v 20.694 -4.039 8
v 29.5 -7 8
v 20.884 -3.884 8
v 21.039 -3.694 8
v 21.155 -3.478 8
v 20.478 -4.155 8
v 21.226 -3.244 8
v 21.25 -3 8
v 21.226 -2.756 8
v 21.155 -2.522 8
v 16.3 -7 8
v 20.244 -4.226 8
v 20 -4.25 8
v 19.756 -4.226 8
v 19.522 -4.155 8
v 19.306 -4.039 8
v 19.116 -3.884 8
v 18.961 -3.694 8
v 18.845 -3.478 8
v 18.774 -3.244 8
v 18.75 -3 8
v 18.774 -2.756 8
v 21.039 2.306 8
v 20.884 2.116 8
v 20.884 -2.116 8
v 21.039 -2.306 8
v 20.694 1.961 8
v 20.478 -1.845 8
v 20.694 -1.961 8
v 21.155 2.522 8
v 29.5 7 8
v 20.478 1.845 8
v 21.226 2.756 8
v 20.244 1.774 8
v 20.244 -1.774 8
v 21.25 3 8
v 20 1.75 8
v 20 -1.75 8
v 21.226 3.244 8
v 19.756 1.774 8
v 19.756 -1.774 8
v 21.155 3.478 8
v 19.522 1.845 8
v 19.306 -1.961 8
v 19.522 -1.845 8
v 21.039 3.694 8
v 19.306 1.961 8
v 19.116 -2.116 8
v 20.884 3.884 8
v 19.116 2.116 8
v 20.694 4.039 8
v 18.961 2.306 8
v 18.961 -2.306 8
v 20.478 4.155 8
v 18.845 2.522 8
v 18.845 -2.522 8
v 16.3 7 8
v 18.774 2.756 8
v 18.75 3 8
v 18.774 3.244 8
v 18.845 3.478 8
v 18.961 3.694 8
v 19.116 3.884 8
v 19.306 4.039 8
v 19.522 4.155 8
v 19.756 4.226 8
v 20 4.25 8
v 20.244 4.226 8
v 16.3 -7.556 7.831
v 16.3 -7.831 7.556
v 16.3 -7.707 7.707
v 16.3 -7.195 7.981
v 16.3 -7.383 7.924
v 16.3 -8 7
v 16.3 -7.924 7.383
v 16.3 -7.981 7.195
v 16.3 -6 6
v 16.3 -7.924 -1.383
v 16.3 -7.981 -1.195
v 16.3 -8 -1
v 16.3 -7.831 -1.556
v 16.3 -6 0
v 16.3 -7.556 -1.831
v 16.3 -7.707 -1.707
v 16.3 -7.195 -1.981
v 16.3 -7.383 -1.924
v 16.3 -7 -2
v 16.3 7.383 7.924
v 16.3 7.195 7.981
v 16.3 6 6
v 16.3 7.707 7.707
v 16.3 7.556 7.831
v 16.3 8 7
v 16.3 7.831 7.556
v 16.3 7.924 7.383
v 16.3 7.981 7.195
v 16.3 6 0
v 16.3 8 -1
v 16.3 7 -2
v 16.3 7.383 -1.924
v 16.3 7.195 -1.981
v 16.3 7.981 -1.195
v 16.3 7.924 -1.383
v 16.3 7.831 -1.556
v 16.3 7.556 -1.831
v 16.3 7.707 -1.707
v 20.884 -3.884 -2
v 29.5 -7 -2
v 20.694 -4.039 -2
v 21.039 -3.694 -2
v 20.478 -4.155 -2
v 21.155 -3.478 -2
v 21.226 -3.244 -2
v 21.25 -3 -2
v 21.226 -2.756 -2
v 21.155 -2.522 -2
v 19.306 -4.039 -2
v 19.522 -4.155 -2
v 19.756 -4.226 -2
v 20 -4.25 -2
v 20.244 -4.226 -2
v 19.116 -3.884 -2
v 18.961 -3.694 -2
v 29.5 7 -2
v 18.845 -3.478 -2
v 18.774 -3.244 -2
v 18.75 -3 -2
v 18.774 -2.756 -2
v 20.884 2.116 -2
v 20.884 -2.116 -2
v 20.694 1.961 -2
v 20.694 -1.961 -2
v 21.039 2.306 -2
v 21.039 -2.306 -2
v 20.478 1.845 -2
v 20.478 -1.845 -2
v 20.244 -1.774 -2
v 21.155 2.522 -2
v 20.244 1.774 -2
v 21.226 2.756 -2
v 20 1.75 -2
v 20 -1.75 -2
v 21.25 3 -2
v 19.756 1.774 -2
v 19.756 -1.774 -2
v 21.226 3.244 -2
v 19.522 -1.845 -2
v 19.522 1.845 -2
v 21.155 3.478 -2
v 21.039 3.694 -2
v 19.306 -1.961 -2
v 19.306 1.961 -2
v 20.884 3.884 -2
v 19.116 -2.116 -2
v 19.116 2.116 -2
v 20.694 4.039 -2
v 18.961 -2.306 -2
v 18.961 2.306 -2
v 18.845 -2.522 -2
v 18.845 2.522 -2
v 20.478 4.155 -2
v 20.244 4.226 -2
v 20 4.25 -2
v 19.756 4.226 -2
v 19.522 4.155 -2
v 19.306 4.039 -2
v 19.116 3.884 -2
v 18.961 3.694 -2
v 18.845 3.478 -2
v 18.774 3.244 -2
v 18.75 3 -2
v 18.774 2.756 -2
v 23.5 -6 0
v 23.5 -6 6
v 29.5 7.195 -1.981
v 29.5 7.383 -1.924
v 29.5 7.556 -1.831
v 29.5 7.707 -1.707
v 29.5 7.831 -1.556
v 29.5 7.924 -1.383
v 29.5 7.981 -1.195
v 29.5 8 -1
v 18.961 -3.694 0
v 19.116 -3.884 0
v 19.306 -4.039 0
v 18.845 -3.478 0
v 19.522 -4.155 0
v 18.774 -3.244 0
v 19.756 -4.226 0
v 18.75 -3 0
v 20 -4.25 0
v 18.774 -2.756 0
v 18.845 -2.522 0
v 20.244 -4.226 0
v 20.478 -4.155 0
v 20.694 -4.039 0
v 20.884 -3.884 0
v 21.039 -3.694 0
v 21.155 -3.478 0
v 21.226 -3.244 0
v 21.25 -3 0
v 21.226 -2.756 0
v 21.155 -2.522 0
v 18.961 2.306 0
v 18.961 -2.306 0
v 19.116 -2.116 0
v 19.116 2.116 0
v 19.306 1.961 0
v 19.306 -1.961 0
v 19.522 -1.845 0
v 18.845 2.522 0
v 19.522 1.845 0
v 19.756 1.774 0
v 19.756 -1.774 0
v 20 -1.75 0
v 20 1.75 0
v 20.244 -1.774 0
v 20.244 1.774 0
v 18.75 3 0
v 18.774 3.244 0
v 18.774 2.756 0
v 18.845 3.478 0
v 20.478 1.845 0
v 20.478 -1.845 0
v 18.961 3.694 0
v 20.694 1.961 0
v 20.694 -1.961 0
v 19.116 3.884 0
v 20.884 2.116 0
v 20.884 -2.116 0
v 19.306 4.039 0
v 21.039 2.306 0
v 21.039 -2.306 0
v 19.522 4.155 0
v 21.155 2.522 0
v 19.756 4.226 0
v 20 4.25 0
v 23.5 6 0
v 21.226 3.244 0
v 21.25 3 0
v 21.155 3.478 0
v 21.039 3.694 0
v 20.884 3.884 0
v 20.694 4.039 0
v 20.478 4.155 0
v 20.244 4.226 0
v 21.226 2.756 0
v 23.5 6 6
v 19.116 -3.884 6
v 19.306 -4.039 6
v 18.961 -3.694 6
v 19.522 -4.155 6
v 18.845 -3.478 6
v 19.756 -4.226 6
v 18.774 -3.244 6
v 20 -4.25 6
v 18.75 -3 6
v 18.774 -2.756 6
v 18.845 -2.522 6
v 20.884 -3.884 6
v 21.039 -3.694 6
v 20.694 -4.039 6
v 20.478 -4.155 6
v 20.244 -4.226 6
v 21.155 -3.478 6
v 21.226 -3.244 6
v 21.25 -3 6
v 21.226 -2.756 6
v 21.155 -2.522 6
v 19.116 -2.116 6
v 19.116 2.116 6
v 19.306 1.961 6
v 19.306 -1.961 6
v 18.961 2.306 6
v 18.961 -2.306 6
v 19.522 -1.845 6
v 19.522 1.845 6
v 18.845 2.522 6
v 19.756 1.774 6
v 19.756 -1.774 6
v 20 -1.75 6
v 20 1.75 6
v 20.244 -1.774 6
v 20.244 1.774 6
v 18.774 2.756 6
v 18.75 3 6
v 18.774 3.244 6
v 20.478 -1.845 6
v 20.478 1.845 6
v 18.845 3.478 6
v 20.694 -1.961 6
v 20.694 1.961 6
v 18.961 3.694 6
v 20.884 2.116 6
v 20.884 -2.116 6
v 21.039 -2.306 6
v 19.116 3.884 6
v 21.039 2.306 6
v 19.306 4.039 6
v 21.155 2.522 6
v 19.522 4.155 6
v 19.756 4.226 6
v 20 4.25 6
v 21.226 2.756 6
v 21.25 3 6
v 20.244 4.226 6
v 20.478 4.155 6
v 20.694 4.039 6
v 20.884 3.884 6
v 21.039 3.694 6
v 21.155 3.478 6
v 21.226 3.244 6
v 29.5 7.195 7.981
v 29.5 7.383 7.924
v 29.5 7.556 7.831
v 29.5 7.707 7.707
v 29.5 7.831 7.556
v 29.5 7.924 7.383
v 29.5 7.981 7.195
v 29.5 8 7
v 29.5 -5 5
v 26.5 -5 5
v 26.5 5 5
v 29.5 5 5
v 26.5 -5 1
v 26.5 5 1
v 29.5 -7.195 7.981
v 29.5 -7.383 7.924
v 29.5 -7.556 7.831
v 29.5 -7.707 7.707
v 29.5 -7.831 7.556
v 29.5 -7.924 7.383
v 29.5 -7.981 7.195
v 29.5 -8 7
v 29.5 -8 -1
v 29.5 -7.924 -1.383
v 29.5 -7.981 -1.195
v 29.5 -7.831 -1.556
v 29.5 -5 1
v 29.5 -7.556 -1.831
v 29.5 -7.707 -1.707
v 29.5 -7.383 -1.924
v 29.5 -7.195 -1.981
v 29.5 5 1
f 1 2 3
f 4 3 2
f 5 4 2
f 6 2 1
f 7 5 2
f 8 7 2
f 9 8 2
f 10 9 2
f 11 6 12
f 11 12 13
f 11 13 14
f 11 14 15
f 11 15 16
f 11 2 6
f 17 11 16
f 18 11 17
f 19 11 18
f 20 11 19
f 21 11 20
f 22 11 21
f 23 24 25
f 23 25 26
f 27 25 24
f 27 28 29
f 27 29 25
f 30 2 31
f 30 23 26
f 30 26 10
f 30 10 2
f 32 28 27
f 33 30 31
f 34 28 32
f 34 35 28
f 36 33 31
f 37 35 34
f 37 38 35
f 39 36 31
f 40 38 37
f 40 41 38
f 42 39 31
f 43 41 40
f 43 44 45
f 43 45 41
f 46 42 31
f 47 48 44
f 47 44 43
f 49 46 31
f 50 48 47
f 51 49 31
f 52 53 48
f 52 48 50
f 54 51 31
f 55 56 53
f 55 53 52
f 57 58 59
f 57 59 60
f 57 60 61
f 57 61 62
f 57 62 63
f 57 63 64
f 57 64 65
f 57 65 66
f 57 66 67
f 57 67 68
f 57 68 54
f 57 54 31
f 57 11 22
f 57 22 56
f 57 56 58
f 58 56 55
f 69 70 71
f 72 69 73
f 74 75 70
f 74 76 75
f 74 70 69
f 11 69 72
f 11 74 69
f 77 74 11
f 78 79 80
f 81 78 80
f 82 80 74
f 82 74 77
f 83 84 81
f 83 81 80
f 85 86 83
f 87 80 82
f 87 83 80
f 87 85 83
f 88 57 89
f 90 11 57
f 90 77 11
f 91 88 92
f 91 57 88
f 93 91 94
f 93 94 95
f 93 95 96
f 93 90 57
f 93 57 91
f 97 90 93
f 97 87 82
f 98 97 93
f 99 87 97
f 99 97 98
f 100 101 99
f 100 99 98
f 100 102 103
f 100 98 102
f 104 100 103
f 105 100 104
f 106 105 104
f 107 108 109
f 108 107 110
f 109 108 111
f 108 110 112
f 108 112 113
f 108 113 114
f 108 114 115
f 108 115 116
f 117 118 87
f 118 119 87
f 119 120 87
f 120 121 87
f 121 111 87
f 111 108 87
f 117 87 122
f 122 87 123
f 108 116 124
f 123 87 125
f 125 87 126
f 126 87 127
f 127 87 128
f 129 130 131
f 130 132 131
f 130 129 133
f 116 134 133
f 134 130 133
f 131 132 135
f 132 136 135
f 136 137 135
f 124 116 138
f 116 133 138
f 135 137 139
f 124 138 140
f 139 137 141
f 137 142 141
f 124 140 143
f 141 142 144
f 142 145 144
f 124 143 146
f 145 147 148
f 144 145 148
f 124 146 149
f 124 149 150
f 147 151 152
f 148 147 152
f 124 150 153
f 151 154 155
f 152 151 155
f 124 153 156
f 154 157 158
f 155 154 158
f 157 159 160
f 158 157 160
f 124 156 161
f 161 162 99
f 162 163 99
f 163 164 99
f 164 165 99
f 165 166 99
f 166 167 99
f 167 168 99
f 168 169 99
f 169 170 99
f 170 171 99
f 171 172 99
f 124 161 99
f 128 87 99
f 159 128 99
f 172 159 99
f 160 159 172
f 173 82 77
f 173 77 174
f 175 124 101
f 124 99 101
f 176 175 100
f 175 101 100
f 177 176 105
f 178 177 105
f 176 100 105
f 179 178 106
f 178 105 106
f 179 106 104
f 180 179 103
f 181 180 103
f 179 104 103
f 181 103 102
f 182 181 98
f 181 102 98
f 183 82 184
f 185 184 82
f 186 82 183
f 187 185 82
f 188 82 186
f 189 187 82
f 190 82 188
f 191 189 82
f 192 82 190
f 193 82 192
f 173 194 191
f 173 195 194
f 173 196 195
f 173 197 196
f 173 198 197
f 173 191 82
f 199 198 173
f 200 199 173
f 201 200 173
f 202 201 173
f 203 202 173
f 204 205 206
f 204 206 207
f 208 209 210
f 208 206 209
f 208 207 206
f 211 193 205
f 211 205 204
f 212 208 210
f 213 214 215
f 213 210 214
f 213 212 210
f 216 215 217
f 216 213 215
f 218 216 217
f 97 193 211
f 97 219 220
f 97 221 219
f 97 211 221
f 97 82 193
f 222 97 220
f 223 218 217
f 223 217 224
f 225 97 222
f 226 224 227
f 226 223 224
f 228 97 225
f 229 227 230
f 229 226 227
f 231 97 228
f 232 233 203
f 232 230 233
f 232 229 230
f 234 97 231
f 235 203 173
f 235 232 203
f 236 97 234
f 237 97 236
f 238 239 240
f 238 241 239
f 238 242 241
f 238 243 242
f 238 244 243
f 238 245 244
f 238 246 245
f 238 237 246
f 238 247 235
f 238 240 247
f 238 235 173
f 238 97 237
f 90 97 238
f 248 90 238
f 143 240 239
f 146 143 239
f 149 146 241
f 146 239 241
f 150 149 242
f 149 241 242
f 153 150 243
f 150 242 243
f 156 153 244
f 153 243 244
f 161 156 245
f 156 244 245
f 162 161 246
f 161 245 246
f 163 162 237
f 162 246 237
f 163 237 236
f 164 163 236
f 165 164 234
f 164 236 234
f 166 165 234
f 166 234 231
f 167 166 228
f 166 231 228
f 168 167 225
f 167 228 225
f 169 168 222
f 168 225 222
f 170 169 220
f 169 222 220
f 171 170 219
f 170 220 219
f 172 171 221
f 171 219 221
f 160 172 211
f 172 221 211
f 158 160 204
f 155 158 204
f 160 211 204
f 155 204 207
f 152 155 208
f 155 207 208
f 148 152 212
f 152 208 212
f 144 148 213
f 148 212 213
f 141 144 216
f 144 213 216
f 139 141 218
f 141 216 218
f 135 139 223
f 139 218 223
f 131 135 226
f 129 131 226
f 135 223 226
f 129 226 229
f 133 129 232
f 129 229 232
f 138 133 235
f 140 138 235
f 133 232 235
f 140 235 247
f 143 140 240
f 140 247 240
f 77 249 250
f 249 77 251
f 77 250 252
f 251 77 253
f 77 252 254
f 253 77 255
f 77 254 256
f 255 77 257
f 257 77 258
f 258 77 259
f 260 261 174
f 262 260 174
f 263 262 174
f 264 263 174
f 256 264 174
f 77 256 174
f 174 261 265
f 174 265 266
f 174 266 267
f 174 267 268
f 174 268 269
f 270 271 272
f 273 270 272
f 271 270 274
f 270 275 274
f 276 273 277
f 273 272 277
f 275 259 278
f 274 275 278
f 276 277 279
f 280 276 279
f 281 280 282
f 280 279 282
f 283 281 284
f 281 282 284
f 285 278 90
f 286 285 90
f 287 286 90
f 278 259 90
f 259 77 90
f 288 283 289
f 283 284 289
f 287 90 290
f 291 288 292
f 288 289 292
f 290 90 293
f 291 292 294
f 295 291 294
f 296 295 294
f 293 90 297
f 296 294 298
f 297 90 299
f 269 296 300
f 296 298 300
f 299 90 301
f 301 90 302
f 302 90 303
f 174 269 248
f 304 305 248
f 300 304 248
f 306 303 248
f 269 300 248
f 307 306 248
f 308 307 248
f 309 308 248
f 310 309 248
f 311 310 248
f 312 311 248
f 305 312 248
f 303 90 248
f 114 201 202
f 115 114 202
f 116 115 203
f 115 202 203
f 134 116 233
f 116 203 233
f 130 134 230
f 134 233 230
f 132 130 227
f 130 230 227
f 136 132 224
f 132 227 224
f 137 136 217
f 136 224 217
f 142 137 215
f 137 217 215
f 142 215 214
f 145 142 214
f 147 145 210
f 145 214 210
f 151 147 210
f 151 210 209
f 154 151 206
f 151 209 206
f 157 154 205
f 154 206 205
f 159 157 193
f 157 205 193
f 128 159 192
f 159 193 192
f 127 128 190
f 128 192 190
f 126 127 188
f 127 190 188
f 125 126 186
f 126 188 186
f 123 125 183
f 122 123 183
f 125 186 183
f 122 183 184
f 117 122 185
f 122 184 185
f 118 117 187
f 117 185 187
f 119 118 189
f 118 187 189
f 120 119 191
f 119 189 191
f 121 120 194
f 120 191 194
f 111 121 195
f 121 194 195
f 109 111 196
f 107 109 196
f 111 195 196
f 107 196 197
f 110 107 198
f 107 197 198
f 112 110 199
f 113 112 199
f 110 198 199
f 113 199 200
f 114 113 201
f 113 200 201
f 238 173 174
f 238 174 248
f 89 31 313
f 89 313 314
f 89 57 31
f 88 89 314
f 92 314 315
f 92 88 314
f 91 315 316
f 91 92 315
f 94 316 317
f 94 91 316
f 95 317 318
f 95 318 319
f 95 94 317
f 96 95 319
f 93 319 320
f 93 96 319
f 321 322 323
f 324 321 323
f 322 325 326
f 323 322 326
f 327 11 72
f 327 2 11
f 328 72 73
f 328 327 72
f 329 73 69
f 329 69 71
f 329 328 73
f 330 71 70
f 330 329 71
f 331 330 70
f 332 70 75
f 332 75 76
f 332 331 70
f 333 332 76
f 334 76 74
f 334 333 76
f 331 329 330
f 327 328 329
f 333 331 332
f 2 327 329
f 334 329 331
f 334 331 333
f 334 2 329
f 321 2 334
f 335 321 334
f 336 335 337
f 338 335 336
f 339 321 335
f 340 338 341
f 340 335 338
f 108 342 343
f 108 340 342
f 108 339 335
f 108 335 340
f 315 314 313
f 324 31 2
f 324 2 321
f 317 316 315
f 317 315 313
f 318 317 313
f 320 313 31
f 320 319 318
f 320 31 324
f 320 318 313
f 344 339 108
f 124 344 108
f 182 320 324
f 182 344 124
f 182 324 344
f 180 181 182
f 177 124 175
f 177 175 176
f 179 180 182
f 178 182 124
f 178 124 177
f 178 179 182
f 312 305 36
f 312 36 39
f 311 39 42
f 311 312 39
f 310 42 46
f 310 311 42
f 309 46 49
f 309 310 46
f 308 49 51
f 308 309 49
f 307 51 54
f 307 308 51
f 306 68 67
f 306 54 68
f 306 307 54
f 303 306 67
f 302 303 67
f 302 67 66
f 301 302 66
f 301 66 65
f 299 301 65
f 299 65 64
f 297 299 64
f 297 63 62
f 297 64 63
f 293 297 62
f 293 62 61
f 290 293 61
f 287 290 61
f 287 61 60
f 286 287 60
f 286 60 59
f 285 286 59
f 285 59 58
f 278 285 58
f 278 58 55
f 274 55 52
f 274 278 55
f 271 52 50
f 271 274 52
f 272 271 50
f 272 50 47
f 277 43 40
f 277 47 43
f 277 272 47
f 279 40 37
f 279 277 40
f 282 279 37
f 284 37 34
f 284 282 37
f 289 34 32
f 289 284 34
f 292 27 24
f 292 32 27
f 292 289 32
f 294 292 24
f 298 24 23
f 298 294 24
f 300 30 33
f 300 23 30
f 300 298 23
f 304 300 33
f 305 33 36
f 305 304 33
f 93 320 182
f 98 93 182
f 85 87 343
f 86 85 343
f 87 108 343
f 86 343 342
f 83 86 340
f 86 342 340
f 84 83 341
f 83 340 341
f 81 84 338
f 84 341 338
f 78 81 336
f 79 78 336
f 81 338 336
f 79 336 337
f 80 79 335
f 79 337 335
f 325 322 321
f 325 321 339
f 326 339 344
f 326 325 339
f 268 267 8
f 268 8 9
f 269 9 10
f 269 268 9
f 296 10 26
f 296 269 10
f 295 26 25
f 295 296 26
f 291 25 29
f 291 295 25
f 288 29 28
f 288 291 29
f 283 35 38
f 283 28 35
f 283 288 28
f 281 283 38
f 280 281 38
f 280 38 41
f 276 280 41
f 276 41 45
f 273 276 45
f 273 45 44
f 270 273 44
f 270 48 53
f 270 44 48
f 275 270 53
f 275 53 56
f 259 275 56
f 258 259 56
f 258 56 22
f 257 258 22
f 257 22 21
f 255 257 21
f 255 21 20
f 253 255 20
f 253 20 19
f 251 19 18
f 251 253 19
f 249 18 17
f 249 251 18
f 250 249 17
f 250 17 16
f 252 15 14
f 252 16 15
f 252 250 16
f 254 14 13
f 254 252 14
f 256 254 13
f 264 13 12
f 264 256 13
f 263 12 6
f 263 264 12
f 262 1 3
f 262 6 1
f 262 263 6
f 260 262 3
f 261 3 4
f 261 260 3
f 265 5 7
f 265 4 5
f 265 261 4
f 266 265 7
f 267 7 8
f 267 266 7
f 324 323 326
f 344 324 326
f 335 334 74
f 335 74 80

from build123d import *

# Parameters (mm, degrees)
SKETCH1_W               = 7.2
SKETCH1_H               = 12
BOSS_EXTRUDE2_DEPTH     = 6
SHELL1_T                = 2
SKETCH4_R               = 1.25
CUT_EXTRUDE2_DEPTH      = 28.897132469
CUT_EXTRUDE2_DEPTH_BACK = 2
SKETCH5_W               = 10
SKETCH5_H               = 16
BOSS_EXTRUDE3_DEPTH     = 4
SHELL2_T                = -3
FILLET1_R               = 1


with BuildPart() as part:
    # Sketch1 → Boss-Extrude2 (new body)
    with BuildSketch(Plane.XY):
        with Locations((19.9, 0)):
            Rectangle(SKETCH1_W, SKETCH1_H)
    extrude(amount=BOSS_EXTRUDE2_DEPTH)

    # Shell1
    shell1_openings = [part.faces().sort_by_distance(p)[0] for p in [
        (16.3, 0, 3),
    ]]
    offset(amount=SHELL1_T, openings=shell1_openings, kind=Kind.INTERSECTION)

    # Sketch4 → Cut-Extrude2 (cut, two sides)
    with BuildSketch(Plane.XY) as cut_extrude2_sk:
        with Locations((20, -3)):
            Circle(SKETCH4_R)
        with Locations((20, 3)):
            Circle(SKETCH4_R)
    extrude(amount=CUT_EXTRUDE2_DEPTH, mode=Mode.SUBTRACT)
    extrude(cut_extrude2_sk.sketch, amount=-CUT_EXTRUDE2_DEPTH_BACK, mode=Mode.SUBTRACT)

    # Sketch5 → Boss-Extrude3 (add)
    with BuildSketch(Plane(origin=(25.5, 0, 0), x_dir=(0, 0, -1), z_dir=(1, 0, 0))):
        with Locations((-3, 0)):
            Rectangle(SKETCH5_W, SKETCH5_H)
    extrude(amount=BOSS_EXTRUDE3_DEPTH)

    # Shell2
    shell2_openings = [part.faces().sort_by_distance(p)[0] for p in [
        (29.5, 0, 3),
    ]]
    offset(amount=SHELL2_T, openings=shell2_openings, kind=Kind.INTERSECTION)

    # Fillet1
    fillet1_edges = [part.edges().sort_by_distance(p)[0] for p in [
        (22.9, -8, 8),
        (22.9, -8, -2),
        (22.9, 8, -2),
        (22.9, 8, 8),
    ]]
    fillet(fillet1_edges, radius=FILLET1_R)


solid = part.part
